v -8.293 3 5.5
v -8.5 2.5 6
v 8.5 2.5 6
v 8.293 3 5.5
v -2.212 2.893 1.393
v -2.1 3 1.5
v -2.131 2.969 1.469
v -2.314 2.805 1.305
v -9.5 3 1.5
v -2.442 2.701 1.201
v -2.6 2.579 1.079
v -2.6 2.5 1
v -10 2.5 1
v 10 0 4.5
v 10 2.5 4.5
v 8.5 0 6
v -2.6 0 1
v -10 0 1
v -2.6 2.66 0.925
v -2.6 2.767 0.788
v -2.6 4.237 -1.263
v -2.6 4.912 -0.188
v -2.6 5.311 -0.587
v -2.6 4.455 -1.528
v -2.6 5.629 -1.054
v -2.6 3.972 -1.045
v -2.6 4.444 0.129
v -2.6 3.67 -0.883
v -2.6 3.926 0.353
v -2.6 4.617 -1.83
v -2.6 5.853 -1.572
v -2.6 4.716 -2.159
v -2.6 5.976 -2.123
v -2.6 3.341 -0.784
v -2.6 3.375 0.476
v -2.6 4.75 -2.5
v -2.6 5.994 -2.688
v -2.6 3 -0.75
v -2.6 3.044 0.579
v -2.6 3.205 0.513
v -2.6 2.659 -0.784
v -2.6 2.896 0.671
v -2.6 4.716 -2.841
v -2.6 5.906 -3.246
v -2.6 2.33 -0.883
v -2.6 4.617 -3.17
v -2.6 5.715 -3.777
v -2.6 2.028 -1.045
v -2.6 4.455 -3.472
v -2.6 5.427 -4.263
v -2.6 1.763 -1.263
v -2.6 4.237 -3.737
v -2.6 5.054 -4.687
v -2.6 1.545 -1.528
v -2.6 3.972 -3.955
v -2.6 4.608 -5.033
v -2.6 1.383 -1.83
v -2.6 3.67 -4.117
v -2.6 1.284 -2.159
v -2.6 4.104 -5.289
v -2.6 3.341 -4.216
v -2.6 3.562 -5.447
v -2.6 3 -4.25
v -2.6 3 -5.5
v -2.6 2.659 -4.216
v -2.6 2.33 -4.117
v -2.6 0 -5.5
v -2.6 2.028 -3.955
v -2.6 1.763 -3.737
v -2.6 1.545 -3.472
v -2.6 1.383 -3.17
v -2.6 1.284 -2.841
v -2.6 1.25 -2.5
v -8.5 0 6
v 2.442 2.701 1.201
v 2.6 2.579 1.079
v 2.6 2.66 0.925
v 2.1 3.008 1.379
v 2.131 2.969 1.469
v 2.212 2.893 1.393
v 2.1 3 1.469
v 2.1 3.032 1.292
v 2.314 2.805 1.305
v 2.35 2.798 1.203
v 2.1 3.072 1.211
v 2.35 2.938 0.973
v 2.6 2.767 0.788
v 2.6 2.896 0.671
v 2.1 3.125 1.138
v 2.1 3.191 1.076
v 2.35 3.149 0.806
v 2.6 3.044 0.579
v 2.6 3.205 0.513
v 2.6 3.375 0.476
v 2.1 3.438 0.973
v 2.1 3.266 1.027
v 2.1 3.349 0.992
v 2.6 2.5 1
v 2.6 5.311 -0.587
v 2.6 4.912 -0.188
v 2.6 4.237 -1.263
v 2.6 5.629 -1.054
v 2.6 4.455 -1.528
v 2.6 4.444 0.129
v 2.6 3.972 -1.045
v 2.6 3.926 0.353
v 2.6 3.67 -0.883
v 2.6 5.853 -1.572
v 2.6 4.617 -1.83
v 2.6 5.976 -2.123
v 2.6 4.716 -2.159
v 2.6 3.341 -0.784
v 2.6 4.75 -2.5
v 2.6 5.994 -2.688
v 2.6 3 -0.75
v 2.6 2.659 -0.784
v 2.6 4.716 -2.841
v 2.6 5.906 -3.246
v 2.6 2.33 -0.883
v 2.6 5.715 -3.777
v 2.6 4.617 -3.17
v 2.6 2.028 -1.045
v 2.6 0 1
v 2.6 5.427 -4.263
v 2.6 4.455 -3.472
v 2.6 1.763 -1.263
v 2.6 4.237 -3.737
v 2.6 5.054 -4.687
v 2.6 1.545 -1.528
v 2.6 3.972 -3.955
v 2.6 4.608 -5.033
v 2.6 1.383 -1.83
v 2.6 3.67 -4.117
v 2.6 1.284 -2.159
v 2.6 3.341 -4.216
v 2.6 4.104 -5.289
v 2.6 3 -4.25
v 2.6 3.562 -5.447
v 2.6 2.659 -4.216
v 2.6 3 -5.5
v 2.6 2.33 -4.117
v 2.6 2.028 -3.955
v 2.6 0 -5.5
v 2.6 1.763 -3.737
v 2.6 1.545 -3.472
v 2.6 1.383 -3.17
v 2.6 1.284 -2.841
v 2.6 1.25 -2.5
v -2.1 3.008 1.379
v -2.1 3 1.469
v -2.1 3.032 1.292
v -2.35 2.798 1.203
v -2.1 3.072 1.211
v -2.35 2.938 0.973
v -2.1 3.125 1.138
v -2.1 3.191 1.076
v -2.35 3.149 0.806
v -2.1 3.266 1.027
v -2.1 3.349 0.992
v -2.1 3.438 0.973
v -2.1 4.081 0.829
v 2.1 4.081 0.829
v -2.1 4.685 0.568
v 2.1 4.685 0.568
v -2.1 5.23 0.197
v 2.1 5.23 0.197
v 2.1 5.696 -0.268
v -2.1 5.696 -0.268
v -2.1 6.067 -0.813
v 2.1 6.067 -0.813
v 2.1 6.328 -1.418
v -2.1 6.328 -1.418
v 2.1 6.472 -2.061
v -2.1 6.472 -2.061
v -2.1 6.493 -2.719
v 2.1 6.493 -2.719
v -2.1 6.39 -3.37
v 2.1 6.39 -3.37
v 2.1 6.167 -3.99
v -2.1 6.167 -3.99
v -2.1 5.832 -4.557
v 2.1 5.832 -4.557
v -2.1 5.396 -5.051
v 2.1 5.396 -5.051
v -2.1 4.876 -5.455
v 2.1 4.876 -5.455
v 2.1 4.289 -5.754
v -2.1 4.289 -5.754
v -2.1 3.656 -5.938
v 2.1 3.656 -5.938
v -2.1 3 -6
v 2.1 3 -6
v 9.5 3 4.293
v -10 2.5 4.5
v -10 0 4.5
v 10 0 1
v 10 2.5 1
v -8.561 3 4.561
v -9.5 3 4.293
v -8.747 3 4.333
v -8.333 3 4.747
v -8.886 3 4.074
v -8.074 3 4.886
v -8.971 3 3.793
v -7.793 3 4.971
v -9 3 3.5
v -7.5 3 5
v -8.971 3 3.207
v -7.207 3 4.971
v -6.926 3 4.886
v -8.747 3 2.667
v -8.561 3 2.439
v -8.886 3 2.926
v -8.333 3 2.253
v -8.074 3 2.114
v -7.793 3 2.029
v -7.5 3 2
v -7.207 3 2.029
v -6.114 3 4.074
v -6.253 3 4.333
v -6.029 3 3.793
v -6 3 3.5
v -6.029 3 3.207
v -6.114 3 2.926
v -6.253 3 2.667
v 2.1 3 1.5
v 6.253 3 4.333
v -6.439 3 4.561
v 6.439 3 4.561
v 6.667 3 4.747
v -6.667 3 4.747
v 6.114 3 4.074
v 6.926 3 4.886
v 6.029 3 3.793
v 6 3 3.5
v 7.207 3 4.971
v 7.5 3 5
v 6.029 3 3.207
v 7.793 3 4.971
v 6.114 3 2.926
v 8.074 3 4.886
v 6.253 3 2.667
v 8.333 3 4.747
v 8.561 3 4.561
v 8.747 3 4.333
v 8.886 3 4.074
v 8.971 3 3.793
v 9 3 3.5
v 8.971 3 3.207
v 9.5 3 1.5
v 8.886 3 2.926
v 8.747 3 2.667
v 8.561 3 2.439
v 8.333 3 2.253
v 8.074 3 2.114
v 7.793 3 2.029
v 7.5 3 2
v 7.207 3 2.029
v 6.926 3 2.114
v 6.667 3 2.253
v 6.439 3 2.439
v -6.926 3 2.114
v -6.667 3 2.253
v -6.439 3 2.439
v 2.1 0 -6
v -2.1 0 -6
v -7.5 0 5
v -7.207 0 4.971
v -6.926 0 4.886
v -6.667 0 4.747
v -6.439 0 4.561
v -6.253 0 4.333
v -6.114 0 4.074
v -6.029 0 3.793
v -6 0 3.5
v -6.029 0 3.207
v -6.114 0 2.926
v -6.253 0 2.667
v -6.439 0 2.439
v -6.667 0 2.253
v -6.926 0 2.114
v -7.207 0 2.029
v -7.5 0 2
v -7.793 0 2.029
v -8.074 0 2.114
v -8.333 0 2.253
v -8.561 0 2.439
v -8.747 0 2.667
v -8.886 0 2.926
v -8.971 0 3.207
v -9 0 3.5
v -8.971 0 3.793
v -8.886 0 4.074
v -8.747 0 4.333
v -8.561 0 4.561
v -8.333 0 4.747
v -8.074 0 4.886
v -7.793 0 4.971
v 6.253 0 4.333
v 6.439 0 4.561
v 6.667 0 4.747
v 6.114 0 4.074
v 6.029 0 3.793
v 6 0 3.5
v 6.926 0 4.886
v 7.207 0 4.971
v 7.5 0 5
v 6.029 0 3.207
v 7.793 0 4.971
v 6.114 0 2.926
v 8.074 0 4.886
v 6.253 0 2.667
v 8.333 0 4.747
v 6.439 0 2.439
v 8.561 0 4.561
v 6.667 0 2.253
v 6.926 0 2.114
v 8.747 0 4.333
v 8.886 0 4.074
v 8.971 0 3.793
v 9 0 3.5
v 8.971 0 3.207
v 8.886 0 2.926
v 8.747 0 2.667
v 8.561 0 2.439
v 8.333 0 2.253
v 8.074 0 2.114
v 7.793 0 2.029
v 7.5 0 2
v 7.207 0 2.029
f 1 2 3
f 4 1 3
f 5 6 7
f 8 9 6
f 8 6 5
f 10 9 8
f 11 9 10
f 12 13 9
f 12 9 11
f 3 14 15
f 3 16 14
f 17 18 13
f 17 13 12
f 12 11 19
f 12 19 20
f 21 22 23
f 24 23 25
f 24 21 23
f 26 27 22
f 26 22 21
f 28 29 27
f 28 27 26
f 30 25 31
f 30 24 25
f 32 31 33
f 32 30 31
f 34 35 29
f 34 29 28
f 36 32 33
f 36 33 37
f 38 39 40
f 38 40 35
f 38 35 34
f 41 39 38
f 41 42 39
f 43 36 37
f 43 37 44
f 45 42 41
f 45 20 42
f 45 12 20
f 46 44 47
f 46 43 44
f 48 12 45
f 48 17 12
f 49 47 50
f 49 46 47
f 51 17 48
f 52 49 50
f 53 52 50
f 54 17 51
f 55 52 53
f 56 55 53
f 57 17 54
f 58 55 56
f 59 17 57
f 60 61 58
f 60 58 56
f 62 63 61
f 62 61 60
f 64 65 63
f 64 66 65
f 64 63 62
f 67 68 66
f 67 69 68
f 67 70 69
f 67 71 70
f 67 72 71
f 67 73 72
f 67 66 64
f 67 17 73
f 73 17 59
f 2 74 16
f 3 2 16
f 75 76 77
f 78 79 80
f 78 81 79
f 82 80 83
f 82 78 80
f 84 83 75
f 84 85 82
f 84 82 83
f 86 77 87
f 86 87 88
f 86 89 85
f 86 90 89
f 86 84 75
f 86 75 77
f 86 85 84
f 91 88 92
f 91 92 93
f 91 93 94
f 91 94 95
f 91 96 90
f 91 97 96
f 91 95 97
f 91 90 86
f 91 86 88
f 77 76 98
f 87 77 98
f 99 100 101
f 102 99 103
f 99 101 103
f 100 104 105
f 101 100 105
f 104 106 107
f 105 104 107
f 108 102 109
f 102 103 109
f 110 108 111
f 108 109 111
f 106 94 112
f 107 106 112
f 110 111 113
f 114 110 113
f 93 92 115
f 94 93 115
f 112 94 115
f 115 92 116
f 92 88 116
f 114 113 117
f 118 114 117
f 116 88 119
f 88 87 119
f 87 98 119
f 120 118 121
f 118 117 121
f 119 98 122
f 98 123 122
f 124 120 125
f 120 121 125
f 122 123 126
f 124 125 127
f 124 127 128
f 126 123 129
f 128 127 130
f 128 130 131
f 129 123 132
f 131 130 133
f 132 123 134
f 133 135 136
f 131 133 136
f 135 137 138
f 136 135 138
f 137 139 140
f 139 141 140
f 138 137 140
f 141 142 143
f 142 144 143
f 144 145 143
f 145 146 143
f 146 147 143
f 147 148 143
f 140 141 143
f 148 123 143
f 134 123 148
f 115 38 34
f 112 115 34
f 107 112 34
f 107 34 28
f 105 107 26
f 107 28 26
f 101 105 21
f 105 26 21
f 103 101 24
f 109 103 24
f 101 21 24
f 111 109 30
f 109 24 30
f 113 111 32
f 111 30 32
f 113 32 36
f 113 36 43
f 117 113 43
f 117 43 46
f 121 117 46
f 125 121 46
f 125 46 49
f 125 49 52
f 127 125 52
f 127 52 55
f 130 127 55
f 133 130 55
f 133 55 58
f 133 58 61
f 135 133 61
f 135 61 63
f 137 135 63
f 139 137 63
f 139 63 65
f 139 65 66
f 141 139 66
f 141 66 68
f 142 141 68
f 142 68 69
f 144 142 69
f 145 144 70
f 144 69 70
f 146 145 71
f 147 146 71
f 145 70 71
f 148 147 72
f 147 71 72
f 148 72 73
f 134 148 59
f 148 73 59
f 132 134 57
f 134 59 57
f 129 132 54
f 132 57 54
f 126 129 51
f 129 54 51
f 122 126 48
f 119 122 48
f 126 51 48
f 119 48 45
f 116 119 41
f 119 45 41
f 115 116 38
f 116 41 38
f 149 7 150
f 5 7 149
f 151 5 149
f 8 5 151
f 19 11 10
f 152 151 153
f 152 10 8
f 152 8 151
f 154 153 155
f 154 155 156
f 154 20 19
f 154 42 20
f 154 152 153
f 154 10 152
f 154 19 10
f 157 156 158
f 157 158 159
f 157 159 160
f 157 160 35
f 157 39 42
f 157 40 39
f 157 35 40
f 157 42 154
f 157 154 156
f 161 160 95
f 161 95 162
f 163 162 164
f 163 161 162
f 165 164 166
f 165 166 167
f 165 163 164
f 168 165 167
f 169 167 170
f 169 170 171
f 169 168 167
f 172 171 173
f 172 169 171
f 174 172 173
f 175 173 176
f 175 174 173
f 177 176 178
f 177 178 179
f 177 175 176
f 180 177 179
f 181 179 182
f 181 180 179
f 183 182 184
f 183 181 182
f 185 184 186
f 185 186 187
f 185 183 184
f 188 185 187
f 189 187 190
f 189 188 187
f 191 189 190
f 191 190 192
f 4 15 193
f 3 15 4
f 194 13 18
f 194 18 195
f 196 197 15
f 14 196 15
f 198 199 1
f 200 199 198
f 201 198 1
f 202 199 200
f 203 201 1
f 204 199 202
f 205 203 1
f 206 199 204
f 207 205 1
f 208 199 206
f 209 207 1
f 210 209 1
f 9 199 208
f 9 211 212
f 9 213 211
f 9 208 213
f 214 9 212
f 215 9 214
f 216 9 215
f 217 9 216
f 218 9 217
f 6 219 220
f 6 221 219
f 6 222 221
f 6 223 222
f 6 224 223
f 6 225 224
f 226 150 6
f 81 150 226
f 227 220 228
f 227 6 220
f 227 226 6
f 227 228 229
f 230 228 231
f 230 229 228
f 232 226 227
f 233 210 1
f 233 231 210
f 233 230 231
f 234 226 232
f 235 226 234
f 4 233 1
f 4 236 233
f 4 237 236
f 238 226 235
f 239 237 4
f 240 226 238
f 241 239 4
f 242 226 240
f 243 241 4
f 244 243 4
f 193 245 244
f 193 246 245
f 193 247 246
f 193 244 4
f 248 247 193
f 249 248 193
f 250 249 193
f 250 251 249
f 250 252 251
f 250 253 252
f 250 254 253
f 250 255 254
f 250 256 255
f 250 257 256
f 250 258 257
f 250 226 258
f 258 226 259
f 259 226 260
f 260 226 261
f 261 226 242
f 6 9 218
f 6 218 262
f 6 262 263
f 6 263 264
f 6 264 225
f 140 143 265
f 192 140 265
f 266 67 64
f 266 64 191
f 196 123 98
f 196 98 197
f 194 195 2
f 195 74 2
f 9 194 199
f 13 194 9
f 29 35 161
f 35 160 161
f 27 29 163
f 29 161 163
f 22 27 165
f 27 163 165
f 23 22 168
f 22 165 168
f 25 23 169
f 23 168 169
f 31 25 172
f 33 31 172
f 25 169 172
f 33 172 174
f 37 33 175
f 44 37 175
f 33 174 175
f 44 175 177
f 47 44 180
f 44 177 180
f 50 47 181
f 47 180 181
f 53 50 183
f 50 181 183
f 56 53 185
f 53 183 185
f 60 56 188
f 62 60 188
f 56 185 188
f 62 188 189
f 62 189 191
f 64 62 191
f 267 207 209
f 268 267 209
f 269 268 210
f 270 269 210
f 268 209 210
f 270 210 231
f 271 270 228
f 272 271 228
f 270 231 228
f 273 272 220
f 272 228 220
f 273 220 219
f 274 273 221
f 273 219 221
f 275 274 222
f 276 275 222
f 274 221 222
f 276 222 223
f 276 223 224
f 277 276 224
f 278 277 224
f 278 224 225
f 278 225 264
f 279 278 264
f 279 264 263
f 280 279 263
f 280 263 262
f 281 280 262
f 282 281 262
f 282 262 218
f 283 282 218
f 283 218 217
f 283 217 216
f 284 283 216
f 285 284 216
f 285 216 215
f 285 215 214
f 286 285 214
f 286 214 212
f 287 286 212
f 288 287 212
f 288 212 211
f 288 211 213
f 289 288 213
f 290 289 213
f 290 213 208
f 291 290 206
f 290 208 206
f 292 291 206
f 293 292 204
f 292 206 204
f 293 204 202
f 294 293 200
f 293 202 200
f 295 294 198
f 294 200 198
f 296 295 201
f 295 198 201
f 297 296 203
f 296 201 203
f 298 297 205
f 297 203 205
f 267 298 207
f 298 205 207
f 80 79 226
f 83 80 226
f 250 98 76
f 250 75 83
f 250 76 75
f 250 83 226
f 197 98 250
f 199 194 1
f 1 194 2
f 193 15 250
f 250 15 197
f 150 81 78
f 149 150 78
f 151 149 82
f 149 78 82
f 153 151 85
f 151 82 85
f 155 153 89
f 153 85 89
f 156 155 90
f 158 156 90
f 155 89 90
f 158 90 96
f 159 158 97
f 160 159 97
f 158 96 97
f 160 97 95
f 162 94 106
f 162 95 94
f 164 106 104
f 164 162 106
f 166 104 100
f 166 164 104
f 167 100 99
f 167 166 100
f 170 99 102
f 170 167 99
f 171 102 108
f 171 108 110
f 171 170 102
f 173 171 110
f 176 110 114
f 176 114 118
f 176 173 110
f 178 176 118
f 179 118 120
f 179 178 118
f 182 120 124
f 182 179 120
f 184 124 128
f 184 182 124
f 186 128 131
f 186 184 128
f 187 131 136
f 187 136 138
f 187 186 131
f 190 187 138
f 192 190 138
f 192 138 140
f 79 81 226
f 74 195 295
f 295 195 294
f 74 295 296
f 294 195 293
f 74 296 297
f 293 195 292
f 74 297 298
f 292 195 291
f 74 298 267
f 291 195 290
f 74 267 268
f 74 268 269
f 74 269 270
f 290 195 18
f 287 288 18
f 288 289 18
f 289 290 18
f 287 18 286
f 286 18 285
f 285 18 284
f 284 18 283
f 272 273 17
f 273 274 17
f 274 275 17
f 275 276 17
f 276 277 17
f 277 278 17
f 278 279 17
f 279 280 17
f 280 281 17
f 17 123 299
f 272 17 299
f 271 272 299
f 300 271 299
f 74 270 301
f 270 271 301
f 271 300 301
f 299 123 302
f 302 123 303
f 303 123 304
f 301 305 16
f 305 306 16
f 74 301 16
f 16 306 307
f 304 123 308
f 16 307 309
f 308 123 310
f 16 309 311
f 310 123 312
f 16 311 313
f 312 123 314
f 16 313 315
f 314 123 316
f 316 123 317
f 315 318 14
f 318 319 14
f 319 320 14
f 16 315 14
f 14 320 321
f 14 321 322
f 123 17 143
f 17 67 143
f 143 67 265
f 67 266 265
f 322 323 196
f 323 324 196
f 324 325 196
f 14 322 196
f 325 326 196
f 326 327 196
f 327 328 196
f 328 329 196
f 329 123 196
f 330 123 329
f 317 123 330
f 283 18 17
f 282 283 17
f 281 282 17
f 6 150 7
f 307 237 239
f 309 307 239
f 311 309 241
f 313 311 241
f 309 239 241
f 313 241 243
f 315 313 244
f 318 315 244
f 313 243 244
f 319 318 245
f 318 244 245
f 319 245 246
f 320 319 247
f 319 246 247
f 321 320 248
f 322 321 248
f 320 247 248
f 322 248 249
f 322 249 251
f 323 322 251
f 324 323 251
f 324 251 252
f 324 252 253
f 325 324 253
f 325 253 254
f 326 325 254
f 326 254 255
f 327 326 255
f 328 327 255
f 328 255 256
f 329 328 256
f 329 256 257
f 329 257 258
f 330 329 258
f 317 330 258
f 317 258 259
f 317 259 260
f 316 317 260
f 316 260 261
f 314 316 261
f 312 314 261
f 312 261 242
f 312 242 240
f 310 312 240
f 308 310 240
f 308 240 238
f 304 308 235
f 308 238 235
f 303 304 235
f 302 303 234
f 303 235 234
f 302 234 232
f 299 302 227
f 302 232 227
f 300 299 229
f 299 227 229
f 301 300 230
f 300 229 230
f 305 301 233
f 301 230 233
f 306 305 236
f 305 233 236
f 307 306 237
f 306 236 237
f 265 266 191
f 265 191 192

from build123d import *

# Parameters (mm, degrees)
SKIZZE1_W                       = 20
SKIZZE1_H                       = 12
AUFSATZ_LINEAR_AUSTRAGEN1_DEPTH = 3
SCHNITT_LINEAR_AUSTRAGEN1_REACH = 14.042
SKIZZE2_R                       = 1.5
AUFSATZ_LINEAR_AUSTRAGEN2_DEPTH = 20
FASE1_SIZE                      = 1.5
SKIZZE4_R                       = 1.75
SCHNITT_LINEAR_AUSTRAGEN2_DEPTH = 22.868927729
SKIZZE5_W                       = 7.4
SKIZZE5_H                       = 7
SCHNITT_LINEAR_AUSTRAGEN5_DEPTH = 14.351029923
FASE2_SIZE                      = 0.5
VERRUNDUNG1_R                   = 0.5
FASE3_SIZE                      = 0.5


with BuildPart() as part:
    # Skizze1 → Aufsatz-Linear austragen1 (new body)
    with BuildSketch(Plane(origin=(0, 0, 0), x_dir=(1, 0, 0), z_dir=(0, 1, 0))):
        Rectangle(SKIZZE1_W, SKIZZE1_H)
    extrude(amount=AUFSATZ_LINEAR_AUSTRAGEN1_DEPTH)

    # Skizze2 → Schnitt-Linear austragen1 (cut, up to next)
    with BuildSketch(Plane(origin=(0, 3, 0), x_dir=(1, 0, 0), z_dir=(0, 1, 0)), mode=Mode.PRIVATE) as schnitt_linear_austragen1_sk1:
        with Locations(Location((-7.5, -3.5, 0), (0, 0, 270))):
            Circle(SKIZZE2_R)
    schnitt_linear_austragen1_tool1 = extrude(schnitt_linear_austragen1_sk1.sketch, amount=-SCHNITT_LINEAR_AUSTRAGEN1_REACH, mode=Mode.PRIVATE) & part.part
    # Skizze2 → Schnitt-Linear austragen1 (cut, up to next)
    with BuildSketch(Plane(origin=(0, 3, 0), x_dir=(1, 0, 0), z_dir=(0, 1, 0)), mode=Mode.PRIVATE) as schnitt_linear_austragen1_sk2:
        with Locations(Location((7.5, -3.5, 0), (0, 0, 270))):
            Circle(SKIZZE2_R)
    schnitt_linear_austragen1_tool2 = extrude(schnitt_linear_austragen1_sk2.sketch, amount=-SCHNITT_LINEAR_AUSTRAGEN1_REACH, mode=Mode.PRIVATE) & part.part
    add(schnitt_linear_austragen1_tool1.solids().sort_by_distance((-7.5, 3, 3.5))[0], mode=Mode.SUBTRACT)
    add(schnitt_linear_austragen1_tool2.solids().sort_by_distance((7.5, 3, 3.5))[0], mode=Mode.SUBTRACT)

    # Skizze3 → Aufsatz-Linear austragen2 (add)
    with BuildSketch(Plane.ZY.offset(10)):
        with BuildLine():
            Line((-6, 3), (1, 3))
            ThreePointArc((1, 3), (-2.5, 6.5), (-6, 3))
        make_face()
    extrude(amount=-AUFSATZ_LINEAR_AUSTRAGEN2_DEPTH)

    # Fase1
    fase1_edges = [part.edges().sort_by_distance(p)[0] for p in [
        (10, 1.5, 6),
        (-10, 1.5, 6),
    ]]
    chamfer(fase1_edges, length=FASE1_SIZE)

    # Skizze4 → Schnitt-Linear austragen2 (cut, through all)
    with BuildSketch(Plane.ZY.offset(10)):
        with Locations((-2.5, 3)):
            Circle(SKIZZE4_R)
    extrude(amount=-SCHNITT_LINEAR_AUSTRAGEN2_DEPTH, mode=Mode.SUBTRACT)

    # Skizze5 → Schnitt-Linear austragen5 (cut, through all)
    with BuildSketch(Plane(origin=(0, 0, 0), x_dir=(1, 0, 0), z_dir=(0, 1, 0))):
        with Locations((-6.3, 2.5)):
            Rectangle(SKIZZE5_W, SKIZZE5_H)
        with Locations((6.3, 2.5)):
            Rectangle(SKIZZE5_W, SKIZZE5_H)
    extrude(amount=SCHNITT_LINEAR_AUSTRAGEN5_DEPTH, mode=Mode.SUBTRACT)

    # Fase2
    fase2_edges = [part.edges().sort_by_distance(p)[0] for p in [
        (-10, 3, 2.75),
        (6.3, 3, 1),
        (10, 3, 2.75),
        (0, 3, 6),
        (-9.25, 3, 5.25),
        (9.25, 3, 5.25),
        (-6.3, 3, 1),
    ]]
    chamfer(fase2_edges, length=FASE2_SIZE)

    # Verrundung1
    verrundung1_edges = [part.edges().sort_by_distance(p)[0] for p in [
        (0, 3, 1),
    ]]
    fillet(verrundung1_edges, radius=VERRUNDUNG1_R)

    # Fase3
    # the kernel refuses this chamfer: 0.5 mm, written as the material it takes off along each edge
    with BuildSketch(Plane(origin=(2.6, 3, 1.468626967), x_dir=(-0.9996219169112968, 0.027495876610586487, 0), z_dir=(0, 0, 1))) as fase3_piece_1_section:
        Polygon((FASE3_SIZE * 0.999621916911, FASE3_SIZE * 0.0274958766106), (-FASE3_SIZE * 0.0274958766106, FASE3_SIZE * 0.999621916911), (0, 0), align=None)
    fase3_piece_1 = extrude(amount=1.317214527, mode=Mode.PRIVATE)
    fase3_piece_1 = split(fase3_piece_1, bisect_by=Plane(origin=(2.355172989, 2.984397258, 1.484397258), z_dir=(0, 0.7071067811865476, -0.7071067811865476)), keep=Keep.TOP, mode=Mode.PRIVATE)
    add(fase3_piece_1, mode=Mode.SUBTRACT)
    with BuildSketch(Plane(origin=(-2.6, 3, 1.468626967), x_dir=(0.9996219169112968, 0.027495876610586487, 0), z_dir=(0, 0, 1))) as fase3_piece_2_section:
        Polygon((FASE3_SIZE * 0.999621916911, -FASE3_SIZE * 0.0274958766106), (-FASE3_SIZE * 0.0274958766106, -FASE3_SIZE * 0.999621916911), (0, 0), align=None)
    fase3_piece_2 = extrude(amount=1.317214527, mode=Mode.PRIVATE)
    fase3_piece_2 = split(fase3_piece_2, bisect_by=Plane(origin=(-2.355172989, 2.984397258, 1.484397258), z_dir=(0, 0.7071067811865476, -0.7071067811865476)), keep=Keep.TOP, mode=Mode.PRIVATE)
    add(fase3_piece_2, mode=Mode.SUBTRACT)
    with BuildSketch(Plane(origin=(2.6, 3, -2.5), x_dir=(0, 0.125, 0.9921567416492215), z_dir=(0, -0.9921567416492215, 0.125))) as fase3_piece_3:
        Polygon((3.5 - FASE3_SIZE, 0), (3.5, FASE3_SIZE), (3.5, 0), align=None)
    revolve(axis=Axis((2.6, 3, -2.5), (-1, 0, 0)), revolution_arc=172.819244219, mode=Mode.SUBTRACT)
    with BuildSketch(Plane(origin=(-2.6, 3.5, 1.468626967), x_dir=(0, -1, 0), z_dir=(0, 0, 1))) as fase3_piece_4_section:
        Polygon((0.5, FASE3_SIZE), (0.5 + FASE3_SIZE, 0), (0.5, 0), align=None)
    fase3_piece_4 = revolve(axis=Axis((-2.6, 3.5, 1.468626967), (1, 0, 0)), revolution_arc=82.819244219, mode=Mode.PRIVATE)
    fase3_piece_4 = split(fase3_piece_4, bisect_by=Plane(origin=(-2.375928001, 2.853387765, 1.353387765), z_dir=(0, 0.7071067811865476, -0.7071067811865476)), keep=Keep.TOP, mode=Mode.PRIVATE)
    add(fase3_piece_4, mode=Mode.SUBTRACT)
    with BuildSketch(Plane(origin=(2.6, 3.5, 1.468626967), x_dir=(0, -1, 0), z_dir=(0, 0, 1))) as fase3_piece_5_section:
        Polygon((0.5 + FASE3_SIZE, 0), (0.5, -FASE3_SIZE), (0.5, 0), align=None)
    fase3_piece_5 = revolve(axis=Axis((2.6, 3.5, 1.468626967), (1, 0, 0)), revolution_arc=82.819244219, mode=Mode.PRIVATE)
    fase3_piece_5 = split(fase3_piece_5, bisect_by=Plane(origin=(2.437201985, 2.797231412, 1.297231412), z_dir=(0, 0.7071067811865476, -0.7071067811865476)), keep=Keep.TOP, mode=Mode.PRIVATE)
    add(fase3_piece_5, mode=Mode.SUBTRACT)
    with BuildSketch(Plane(origin=(-2.6, 3, -2.5), x_dir=(0, 0.125, 0.9921567416492215), z_dir=(0, -0.9921567416492215, 0.125))) as fase3_piece_6:
        Polygon((3.5 - FASE3_SIZE, 0), (3.5, -FASE3_SIZE), (3.5, 0), align=None)
    revolve(axis=Axis((-2.6, 3, -2.5), (-1, 0, 0)), revolution_arc=172.819244219, mode=Mode.SUBTRACT)
    with BuildSketch(Plane(origin=(-2.6, -1.285841494, -6), x_dir=(-0.02749587661058651, 0, 0.9996219169112968), z_dir=(0, 1, 0))) as fase3_piece_7:
        Polygon((FASE3_SIZE * 0.999621916911, FASE3_SIZE * 0.0274958766106), (-FASE3_SIZE * 0.0274958766106, FASE3_SIZE * 0.999621916911), (0, 0), align=None)
    extrude(amount=4.285841494, mode=Mode.SUBTRACT)
    with BuildSketch(Plane(origin=(2.6, -1.285841494, -6), x_dir=(0.02749587661058651, 0, 0.9996219169112968), z_dir=(0, 1, 0))) as fase3_piece_8:
        Polygon((FASE3_SIZE * 0.999621916911, -FASE3_SIZE * 0.0274958766106), (-FASE3_SIZE * 0.0274958766106, -FASE3_SIZE * 0.999621916911), (0, 0), align=None)
    extrude(amount=4.285841494, mode=Mode.SUBTRACT)


solid = part.part
